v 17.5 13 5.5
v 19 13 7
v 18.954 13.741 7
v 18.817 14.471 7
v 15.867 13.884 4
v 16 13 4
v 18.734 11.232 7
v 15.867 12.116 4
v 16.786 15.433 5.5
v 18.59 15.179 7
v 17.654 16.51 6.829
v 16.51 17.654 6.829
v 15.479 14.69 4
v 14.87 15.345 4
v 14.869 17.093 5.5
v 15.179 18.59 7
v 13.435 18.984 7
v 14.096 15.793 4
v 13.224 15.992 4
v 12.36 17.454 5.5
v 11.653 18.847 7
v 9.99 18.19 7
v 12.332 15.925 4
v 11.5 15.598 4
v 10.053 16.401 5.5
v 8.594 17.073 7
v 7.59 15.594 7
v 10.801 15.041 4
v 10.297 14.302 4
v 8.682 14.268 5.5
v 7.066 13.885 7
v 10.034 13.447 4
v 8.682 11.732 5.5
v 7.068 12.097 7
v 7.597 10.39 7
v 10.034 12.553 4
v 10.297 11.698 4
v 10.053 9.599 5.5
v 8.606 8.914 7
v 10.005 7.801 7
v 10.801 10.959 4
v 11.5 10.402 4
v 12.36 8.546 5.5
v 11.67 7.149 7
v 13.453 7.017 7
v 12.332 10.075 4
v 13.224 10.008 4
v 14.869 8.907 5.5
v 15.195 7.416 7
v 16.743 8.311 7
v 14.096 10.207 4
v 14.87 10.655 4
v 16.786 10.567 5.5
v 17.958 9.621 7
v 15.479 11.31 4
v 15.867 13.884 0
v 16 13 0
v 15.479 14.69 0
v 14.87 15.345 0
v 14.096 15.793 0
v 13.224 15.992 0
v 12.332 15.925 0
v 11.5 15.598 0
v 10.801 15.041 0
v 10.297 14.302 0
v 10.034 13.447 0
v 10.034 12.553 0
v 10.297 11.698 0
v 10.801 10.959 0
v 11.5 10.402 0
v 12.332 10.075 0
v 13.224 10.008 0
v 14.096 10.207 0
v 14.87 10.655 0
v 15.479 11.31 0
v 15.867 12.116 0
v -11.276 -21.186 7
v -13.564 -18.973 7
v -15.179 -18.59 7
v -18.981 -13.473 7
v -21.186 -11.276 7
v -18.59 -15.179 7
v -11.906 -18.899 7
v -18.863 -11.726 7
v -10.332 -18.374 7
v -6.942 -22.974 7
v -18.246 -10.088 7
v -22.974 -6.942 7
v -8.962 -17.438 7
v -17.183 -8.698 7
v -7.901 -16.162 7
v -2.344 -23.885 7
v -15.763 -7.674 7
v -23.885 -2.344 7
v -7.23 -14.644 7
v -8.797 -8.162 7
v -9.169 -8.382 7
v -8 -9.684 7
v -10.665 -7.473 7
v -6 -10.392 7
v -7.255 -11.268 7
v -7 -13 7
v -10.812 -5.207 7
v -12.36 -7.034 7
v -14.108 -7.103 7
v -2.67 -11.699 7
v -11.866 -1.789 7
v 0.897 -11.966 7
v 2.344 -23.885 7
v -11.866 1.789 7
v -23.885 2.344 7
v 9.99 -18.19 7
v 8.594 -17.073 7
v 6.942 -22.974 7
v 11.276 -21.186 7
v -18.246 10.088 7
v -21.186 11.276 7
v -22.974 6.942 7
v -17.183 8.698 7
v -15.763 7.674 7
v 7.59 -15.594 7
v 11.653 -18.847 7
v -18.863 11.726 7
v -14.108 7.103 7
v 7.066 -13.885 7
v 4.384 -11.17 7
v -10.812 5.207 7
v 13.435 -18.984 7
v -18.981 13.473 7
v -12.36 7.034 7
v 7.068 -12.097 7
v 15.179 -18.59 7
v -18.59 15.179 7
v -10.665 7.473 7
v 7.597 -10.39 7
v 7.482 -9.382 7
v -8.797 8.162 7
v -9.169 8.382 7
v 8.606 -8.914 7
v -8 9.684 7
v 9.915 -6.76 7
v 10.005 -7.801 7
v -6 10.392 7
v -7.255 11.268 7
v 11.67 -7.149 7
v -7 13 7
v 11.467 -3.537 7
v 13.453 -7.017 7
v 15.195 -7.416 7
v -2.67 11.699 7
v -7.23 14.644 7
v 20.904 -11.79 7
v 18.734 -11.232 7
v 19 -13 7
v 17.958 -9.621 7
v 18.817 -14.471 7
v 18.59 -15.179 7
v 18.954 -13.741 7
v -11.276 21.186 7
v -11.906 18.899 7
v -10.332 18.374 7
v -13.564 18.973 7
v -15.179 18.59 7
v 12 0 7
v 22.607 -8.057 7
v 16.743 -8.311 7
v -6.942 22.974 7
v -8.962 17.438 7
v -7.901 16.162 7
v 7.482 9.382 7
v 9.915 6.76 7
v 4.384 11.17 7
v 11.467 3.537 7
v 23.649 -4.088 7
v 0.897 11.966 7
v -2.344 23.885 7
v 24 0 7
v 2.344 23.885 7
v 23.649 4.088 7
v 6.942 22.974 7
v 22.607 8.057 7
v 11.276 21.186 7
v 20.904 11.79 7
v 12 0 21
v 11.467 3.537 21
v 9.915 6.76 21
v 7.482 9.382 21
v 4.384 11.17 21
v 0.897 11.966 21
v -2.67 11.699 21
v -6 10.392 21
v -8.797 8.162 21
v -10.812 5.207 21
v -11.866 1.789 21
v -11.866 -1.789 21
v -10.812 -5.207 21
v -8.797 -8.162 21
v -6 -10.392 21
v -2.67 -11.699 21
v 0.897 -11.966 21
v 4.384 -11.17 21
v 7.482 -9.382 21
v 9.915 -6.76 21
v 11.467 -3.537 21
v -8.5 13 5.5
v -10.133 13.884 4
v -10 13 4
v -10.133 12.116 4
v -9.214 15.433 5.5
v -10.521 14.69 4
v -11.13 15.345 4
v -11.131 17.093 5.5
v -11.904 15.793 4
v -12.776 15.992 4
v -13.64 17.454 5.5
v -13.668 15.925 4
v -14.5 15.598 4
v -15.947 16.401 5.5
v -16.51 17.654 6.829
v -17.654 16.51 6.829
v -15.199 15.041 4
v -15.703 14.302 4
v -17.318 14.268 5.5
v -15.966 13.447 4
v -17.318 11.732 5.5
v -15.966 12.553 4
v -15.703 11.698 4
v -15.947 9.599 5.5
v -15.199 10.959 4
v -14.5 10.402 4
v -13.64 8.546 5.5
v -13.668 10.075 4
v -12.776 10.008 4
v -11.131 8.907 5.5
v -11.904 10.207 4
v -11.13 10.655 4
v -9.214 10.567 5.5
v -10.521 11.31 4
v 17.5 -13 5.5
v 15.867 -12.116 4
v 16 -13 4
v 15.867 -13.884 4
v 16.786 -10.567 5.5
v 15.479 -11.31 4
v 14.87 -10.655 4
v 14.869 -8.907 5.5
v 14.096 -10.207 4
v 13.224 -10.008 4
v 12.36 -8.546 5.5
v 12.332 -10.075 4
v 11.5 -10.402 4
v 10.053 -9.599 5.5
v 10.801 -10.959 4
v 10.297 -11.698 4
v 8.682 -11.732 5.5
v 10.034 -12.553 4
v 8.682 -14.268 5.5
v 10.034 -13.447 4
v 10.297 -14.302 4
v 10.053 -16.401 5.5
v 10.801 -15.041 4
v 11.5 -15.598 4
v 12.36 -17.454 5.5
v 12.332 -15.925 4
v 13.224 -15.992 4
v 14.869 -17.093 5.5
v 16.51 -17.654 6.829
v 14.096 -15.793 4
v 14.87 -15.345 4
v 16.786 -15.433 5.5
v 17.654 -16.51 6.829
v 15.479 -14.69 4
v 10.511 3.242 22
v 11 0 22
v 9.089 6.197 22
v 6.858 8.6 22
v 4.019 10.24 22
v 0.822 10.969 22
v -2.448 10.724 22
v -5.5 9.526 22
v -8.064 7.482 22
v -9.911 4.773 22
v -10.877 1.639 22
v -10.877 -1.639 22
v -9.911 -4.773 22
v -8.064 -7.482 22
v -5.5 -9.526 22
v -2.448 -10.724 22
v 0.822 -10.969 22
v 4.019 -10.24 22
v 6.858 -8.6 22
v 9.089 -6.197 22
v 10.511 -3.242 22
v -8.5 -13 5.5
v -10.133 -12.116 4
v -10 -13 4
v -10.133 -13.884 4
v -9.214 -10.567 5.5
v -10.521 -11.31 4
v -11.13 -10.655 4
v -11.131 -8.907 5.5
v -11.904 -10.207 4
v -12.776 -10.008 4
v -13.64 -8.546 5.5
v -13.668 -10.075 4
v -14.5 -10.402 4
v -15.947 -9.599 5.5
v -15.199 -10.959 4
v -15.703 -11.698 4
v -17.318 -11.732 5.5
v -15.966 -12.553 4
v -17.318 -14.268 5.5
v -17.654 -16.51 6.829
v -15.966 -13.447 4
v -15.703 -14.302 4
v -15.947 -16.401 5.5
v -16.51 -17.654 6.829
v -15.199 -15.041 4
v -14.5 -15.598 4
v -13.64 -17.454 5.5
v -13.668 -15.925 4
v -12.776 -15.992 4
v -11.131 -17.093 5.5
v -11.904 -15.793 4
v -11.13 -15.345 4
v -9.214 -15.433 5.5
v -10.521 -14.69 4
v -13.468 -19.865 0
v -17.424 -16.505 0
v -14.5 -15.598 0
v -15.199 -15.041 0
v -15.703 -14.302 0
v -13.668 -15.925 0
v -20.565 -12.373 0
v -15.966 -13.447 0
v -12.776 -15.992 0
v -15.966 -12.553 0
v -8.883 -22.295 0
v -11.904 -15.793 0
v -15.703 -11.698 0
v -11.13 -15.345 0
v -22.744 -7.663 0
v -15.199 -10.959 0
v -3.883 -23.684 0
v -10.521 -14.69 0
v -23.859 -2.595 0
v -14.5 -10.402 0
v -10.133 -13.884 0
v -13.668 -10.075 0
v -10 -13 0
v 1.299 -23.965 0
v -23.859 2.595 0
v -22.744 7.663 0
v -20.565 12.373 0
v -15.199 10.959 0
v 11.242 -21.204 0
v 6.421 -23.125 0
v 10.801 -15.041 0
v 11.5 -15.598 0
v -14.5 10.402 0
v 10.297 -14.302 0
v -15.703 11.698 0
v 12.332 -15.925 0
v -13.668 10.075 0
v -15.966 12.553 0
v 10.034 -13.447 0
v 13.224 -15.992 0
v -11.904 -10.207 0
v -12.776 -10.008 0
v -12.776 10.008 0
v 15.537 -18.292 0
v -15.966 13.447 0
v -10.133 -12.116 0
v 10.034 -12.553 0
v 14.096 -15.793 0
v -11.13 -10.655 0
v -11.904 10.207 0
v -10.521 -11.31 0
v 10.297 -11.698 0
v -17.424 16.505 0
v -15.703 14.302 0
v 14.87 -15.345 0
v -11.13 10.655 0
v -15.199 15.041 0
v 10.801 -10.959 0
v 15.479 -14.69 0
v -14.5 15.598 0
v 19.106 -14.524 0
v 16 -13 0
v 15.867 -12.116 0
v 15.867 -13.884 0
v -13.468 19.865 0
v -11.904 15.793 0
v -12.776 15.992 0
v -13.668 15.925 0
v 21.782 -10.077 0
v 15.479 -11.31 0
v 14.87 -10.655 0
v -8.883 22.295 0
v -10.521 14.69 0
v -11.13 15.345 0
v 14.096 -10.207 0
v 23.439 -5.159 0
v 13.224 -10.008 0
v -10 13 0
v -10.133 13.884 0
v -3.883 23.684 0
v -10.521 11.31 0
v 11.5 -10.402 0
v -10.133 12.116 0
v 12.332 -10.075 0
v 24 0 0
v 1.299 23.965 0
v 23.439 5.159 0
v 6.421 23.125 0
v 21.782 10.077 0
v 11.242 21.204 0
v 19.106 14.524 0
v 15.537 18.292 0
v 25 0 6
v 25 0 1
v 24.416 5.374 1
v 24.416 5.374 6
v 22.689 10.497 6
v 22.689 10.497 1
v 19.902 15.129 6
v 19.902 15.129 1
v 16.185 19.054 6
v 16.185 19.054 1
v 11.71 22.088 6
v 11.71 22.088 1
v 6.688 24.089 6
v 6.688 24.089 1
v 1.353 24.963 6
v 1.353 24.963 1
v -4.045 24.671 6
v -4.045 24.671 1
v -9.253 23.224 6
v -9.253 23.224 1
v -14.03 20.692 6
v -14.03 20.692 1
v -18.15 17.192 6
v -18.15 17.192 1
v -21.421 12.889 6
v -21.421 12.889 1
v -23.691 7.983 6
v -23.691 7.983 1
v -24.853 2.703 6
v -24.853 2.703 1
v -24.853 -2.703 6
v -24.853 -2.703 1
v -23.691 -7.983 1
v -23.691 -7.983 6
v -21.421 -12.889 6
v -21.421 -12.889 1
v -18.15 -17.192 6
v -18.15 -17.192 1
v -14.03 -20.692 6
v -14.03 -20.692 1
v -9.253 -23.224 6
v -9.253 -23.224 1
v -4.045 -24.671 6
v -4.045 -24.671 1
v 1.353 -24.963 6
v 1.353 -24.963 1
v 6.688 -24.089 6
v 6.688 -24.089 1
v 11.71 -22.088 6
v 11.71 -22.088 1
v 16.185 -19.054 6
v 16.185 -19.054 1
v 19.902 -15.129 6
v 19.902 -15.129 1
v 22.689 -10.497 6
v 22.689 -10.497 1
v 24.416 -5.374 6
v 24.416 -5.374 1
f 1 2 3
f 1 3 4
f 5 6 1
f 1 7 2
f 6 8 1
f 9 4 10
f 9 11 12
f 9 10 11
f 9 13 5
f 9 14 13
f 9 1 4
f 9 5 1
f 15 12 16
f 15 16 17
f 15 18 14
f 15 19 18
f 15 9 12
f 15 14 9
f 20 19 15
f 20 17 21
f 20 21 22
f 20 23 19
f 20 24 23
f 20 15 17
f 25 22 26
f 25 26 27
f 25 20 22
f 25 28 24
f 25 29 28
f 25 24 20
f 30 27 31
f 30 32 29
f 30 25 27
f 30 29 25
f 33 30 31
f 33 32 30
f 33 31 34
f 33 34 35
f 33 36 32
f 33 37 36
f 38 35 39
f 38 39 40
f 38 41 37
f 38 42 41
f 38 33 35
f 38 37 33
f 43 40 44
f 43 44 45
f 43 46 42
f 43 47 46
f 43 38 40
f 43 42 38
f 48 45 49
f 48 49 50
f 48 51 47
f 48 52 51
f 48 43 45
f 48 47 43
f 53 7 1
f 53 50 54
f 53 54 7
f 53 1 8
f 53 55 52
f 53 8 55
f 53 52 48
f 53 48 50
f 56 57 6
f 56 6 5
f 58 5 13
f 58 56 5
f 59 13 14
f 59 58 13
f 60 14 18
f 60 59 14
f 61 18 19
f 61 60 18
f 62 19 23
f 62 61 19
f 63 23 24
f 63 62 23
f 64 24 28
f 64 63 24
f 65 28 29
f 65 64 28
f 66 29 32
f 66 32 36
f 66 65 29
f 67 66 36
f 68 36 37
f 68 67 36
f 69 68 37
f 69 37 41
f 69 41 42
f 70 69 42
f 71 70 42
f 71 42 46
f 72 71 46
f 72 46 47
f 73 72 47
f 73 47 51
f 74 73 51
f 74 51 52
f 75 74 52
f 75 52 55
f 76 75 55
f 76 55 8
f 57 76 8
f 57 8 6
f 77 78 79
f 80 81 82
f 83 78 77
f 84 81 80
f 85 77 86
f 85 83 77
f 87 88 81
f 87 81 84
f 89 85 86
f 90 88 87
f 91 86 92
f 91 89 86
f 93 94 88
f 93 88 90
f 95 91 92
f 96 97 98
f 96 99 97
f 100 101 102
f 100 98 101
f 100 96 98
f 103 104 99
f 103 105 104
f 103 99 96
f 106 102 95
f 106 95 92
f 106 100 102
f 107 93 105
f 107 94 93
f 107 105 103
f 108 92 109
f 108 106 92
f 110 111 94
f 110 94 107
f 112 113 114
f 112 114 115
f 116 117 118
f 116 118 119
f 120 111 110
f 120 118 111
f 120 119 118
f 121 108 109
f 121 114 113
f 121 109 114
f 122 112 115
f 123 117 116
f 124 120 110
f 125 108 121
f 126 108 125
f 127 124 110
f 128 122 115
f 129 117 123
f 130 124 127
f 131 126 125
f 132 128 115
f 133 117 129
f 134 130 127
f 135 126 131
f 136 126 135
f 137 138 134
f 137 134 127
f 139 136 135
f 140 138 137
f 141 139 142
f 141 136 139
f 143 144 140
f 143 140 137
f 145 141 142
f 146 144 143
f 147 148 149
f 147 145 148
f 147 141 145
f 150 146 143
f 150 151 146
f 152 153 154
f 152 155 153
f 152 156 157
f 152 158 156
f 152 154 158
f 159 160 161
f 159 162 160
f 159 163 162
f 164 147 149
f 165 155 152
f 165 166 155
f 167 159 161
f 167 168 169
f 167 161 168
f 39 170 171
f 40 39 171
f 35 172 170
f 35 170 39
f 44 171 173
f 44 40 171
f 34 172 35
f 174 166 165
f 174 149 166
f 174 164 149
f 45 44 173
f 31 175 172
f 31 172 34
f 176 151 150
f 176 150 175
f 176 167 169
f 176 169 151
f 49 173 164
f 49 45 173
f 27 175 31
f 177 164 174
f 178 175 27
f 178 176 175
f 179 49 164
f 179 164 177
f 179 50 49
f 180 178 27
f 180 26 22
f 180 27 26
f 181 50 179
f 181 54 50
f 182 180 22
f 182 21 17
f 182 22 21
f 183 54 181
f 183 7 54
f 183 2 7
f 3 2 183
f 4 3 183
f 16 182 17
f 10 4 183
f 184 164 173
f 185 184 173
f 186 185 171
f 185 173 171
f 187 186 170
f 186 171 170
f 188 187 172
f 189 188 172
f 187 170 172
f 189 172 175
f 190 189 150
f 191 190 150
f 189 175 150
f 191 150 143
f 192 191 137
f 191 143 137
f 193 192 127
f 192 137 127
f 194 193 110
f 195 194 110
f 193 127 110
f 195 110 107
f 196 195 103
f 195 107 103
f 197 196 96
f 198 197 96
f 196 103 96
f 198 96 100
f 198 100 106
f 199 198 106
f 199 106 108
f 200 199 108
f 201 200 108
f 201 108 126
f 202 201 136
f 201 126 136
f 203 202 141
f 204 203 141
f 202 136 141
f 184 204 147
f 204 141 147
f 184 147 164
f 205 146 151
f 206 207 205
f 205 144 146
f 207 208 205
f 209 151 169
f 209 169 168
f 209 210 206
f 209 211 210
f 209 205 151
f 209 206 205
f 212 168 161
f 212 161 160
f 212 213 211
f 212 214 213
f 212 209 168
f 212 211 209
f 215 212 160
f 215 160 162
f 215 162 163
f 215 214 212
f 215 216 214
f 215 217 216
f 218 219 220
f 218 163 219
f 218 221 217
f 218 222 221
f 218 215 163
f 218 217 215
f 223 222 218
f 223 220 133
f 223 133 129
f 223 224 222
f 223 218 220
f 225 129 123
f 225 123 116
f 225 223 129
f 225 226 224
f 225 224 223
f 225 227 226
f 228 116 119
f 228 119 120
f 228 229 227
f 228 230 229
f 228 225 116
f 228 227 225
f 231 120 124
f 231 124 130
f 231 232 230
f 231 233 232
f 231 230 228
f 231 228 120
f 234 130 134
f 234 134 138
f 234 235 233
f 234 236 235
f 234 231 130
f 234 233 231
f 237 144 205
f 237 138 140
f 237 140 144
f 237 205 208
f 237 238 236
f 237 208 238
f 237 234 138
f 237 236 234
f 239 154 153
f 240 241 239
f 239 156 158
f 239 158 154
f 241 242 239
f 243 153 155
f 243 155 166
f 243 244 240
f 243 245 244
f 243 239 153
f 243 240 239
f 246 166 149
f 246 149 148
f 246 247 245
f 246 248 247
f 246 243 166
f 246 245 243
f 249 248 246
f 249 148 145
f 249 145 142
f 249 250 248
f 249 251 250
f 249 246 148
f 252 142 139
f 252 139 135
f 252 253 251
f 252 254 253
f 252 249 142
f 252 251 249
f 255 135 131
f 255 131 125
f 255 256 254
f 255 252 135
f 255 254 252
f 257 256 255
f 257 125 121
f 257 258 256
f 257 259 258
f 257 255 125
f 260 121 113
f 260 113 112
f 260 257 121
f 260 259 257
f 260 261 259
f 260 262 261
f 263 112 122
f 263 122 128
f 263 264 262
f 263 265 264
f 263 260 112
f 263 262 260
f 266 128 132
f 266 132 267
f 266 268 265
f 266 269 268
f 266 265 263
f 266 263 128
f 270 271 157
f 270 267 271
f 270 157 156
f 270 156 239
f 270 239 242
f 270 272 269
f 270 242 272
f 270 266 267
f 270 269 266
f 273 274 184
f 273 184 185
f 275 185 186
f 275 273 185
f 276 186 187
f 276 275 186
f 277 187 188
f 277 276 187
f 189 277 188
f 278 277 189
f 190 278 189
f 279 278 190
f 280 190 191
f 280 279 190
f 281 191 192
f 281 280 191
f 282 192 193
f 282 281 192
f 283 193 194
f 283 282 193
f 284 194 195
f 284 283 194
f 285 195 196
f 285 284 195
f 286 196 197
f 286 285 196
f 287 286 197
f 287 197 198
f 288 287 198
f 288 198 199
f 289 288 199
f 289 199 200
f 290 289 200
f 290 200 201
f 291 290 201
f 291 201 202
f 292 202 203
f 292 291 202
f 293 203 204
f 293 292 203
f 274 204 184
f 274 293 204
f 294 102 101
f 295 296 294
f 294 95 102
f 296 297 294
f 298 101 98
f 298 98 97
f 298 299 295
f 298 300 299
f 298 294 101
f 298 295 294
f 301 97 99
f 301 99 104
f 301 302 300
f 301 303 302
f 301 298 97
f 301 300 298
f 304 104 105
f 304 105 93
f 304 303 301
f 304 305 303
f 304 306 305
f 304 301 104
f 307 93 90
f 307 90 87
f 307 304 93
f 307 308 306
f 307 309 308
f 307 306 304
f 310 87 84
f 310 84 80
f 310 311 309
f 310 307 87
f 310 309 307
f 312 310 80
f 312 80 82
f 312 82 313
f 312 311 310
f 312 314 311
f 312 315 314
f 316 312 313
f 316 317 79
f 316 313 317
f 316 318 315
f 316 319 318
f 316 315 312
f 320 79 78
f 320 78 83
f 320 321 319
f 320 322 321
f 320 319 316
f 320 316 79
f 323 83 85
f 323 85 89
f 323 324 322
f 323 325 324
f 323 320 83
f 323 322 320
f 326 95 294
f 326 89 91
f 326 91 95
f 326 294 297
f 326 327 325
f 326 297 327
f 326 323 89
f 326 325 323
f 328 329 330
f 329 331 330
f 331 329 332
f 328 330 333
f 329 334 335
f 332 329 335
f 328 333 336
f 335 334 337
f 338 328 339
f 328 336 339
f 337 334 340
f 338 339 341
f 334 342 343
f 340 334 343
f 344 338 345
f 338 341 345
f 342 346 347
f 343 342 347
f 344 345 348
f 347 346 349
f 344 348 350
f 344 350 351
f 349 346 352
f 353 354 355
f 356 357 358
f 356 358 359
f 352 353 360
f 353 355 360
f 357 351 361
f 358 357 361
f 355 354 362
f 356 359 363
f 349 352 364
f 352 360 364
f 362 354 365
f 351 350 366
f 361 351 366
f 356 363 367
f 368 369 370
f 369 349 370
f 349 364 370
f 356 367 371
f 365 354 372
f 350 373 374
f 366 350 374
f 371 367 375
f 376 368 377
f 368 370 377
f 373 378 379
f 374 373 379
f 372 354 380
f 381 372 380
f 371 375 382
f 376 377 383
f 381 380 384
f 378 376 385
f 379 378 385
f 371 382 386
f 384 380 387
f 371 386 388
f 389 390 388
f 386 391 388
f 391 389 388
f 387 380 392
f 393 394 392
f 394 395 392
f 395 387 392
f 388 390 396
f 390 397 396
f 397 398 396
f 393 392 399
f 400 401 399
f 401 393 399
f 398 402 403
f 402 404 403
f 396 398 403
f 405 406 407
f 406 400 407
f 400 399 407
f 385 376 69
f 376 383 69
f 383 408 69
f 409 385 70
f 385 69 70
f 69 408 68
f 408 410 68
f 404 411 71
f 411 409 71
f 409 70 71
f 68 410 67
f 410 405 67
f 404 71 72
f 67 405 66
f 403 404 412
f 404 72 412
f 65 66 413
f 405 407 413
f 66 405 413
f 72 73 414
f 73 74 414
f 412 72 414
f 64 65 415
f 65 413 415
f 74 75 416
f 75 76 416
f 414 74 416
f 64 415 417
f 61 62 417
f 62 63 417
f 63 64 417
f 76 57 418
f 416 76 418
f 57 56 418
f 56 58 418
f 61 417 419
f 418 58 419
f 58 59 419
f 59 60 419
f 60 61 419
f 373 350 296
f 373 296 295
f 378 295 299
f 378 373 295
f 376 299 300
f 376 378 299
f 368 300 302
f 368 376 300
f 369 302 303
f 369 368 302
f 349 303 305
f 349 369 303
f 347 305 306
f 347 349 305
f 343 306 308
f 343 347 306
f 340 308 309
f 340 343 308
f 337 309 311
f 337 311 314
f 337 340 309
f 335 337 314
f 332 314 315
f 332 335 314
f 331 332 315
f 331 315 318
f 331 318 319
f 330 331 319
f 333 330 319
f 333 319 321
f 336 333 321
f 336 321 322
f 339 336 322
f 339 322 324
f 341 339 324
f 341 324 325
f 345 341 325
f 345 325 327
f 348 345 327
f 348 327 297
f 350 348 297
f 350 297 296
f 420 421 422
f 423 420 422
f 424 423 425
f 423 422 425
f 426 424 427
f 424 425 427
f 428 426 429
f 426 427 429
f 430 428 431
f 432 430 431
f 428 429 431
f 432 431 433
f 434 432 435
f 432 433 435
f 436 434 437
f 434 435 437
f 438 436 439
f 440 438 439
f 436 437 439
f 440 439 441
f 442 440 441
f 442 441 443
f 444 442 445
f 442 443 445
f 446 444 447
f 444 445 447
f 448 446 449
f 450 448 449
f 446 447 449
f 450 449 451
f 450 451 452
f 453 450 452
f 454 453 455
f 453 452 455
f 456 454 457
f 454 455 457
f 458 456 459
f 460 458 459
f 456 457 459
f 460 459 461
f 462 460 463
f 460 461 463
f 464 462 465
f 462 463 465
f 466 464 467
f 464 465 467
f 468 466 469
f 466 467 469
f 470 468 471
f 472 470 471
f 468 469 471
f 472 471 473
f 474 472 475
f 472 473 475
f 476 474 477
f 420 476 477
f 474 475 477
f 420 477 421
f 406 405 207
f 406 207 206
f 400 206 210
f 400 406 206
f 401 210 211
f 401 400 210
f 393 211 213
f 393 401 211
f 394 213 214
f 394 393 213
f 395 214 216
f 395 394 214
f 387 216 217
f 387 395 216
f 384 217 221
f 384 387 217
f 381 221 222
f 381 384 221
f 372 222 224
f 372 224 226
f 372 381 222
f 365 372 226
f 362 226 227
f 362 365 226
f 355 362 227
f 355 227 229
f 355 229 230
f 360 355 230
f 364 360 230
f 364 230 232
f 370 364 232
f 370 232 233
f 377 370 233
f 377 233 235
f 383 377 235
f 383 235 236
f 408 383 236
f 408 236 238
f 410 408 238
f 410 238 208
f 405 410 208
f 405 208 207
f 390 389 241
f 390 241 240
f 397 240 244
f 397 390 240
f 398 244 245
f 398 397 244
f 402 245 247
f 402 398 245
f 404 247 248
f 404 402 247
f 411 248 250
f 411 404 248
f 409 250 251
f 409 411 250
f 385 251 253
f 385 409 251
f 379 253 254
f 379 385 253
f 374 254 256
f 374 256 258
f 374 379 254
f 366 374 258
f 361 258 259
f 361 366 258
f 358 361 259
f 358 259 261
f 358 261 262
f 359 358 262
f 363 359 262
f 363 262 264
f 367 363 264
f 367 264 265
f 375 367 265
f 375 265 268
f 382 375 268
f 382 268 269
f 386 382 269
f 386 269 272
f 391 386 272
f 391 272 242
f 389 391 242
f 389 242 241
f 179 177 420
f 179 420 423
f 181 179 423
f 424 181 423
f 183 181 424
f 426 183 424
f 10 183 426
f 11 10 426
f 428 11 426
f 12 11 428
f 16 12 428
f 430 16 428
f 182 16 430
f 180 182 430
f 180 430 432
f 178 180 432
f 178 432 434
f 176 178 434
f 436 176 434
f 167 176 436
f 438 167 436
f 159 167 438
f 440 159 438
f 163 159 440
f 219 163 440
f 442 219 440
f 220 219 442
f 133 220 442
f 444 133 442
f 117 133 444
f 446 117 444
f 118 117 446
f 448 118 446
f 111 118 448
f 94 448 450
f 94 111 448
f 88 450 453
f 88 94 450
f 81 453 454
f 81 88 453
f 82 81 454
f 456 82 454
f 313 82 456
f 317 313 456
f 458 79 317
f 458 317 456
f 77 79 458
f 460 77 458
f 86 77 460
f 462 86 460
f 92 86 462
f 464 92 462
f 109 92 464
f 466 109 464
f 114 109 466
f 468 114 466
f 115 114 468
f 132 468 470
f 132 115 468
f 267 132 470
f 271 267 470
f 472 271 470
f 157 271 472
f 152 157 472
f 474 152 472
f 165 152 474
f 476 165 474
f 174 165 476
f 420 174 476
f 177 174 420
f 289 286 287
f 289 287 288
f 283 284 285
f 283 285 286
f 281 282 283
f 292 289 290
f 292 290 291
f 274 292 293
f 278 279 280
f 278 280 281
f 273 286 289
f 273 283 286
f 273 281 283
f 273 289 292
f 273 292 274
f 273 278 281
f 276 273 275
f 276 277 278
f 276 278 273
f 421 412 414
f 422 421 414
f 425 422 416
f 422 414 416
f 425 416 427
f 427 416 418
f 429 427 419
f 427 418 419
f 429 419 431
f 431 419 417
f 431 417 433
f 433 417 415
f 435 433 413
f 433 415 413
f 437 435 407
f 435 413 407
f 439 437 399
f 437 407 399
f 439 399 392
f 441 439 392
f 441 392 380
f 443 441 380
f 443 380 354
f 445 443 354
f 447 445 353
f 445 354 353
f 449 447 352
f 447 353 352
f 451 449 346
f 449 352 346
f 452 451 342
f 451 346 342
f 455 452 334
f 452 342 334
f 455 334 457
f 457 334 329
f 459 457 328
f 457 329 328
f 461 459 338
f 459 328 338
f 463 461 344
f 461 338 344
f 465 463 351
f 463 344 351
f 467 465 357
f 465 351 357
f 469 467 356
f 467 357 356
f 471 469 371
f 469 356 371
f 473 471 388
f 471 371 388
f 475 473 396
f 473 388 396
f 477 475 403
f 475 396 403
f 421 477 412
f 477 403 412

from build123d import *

# Parameters (mm, degrees)
F0_R     = 25
F0_R_2   = 3
F1_DEPTH = 7
F2_R     = 12
F3_DEPTH = 15
F4_SIZE  = 1


# Not quite as in the source:
# - a fillet or chamfer that OpenCascade refuses, or shapes differently, is made with other operations: its cross-section is extruded or revolved along the edge and cut away or added


with BuildPart() as f1:
    # F0 (on Top) → F1 (new body)
    with BuildSketch(Plane.XY):
        Circle(F0_R)
        with Locations((-13, -13)):
            Circle(F0_R_2, mode=Mode.SUBTRACT)
        with Locations((13, -13)):
            Circle(F0_R_2, mode=Mode.SUBTRACT)
        with Locations((-13, 13)):
            Circle(F0_R_2, mode=Mode.SUBTRACT)
        with Locations((13, 13)):
            Circle(F0_R_2, mode=Mode.SUBTRACT)
    extrude(amount=F1_DEPTH)

    # F2 (on face) → F3 (join)
    with BuildSketch(Plane.XY.offset(7)):
        Circle(F2_R)
    extrude(amount=F3_DEPTH)

    # F4
    f4_edges = [f1.edges().sort_by_distance(p)[0] for p in [
        (-12, 0, 22),
        (-25, 0, 7),
        (-25, 0, 0),
    ]]
    chamfer(f4_edges, length=F4_SIZE)

    # F5: chamfer of 3 on 4 edges, made by hand

    # F5_s1 → F5_t2 (revolve, cut)
    with BuildSketch(Plane.XZ.offset(13)):
        Polygon((-7, 7), (-10, 4), (-10, 7), align=None)
    revolve(axis=Axis((-13, -13, 7), (0, 0, 1)), mode=Mode.SUBTRACT)

    # F5_s3 → F5_t4 (revolve, cut)
    with BuildSketch(Plane.XZ.offset(13)):
        Polygon((19, 7), (16, 4), (16, 7), align=None)
    revolve(axis=Axis((13, -13, 7), (0, 0, 1)), mode=Mode.SUBTRACT)

    # F5_s5 → F5_t6 (revolve, cut)
    with BuildSketch(Plane.XZ.offset(-13)):
        Polygon((19, 7), (16, 4), (16, 7), align=None)
    revolve(axis=Axis((13, 13, 7), (0, 0, 1)), mode=Mode.SUBTRACT)

    # F5_s7 → F5_t8 (revolve, cut)
    with BuildSketch(Plane.XZ.offset(-13)):
        Polygon((-7, 7), (-10, 4), (-10, 7), align=None)
    revolve(axis=Axis((-13, 13, 7), (0, 0, 1)), mode=Mode.SUBTRACT)


solid = f1.part
